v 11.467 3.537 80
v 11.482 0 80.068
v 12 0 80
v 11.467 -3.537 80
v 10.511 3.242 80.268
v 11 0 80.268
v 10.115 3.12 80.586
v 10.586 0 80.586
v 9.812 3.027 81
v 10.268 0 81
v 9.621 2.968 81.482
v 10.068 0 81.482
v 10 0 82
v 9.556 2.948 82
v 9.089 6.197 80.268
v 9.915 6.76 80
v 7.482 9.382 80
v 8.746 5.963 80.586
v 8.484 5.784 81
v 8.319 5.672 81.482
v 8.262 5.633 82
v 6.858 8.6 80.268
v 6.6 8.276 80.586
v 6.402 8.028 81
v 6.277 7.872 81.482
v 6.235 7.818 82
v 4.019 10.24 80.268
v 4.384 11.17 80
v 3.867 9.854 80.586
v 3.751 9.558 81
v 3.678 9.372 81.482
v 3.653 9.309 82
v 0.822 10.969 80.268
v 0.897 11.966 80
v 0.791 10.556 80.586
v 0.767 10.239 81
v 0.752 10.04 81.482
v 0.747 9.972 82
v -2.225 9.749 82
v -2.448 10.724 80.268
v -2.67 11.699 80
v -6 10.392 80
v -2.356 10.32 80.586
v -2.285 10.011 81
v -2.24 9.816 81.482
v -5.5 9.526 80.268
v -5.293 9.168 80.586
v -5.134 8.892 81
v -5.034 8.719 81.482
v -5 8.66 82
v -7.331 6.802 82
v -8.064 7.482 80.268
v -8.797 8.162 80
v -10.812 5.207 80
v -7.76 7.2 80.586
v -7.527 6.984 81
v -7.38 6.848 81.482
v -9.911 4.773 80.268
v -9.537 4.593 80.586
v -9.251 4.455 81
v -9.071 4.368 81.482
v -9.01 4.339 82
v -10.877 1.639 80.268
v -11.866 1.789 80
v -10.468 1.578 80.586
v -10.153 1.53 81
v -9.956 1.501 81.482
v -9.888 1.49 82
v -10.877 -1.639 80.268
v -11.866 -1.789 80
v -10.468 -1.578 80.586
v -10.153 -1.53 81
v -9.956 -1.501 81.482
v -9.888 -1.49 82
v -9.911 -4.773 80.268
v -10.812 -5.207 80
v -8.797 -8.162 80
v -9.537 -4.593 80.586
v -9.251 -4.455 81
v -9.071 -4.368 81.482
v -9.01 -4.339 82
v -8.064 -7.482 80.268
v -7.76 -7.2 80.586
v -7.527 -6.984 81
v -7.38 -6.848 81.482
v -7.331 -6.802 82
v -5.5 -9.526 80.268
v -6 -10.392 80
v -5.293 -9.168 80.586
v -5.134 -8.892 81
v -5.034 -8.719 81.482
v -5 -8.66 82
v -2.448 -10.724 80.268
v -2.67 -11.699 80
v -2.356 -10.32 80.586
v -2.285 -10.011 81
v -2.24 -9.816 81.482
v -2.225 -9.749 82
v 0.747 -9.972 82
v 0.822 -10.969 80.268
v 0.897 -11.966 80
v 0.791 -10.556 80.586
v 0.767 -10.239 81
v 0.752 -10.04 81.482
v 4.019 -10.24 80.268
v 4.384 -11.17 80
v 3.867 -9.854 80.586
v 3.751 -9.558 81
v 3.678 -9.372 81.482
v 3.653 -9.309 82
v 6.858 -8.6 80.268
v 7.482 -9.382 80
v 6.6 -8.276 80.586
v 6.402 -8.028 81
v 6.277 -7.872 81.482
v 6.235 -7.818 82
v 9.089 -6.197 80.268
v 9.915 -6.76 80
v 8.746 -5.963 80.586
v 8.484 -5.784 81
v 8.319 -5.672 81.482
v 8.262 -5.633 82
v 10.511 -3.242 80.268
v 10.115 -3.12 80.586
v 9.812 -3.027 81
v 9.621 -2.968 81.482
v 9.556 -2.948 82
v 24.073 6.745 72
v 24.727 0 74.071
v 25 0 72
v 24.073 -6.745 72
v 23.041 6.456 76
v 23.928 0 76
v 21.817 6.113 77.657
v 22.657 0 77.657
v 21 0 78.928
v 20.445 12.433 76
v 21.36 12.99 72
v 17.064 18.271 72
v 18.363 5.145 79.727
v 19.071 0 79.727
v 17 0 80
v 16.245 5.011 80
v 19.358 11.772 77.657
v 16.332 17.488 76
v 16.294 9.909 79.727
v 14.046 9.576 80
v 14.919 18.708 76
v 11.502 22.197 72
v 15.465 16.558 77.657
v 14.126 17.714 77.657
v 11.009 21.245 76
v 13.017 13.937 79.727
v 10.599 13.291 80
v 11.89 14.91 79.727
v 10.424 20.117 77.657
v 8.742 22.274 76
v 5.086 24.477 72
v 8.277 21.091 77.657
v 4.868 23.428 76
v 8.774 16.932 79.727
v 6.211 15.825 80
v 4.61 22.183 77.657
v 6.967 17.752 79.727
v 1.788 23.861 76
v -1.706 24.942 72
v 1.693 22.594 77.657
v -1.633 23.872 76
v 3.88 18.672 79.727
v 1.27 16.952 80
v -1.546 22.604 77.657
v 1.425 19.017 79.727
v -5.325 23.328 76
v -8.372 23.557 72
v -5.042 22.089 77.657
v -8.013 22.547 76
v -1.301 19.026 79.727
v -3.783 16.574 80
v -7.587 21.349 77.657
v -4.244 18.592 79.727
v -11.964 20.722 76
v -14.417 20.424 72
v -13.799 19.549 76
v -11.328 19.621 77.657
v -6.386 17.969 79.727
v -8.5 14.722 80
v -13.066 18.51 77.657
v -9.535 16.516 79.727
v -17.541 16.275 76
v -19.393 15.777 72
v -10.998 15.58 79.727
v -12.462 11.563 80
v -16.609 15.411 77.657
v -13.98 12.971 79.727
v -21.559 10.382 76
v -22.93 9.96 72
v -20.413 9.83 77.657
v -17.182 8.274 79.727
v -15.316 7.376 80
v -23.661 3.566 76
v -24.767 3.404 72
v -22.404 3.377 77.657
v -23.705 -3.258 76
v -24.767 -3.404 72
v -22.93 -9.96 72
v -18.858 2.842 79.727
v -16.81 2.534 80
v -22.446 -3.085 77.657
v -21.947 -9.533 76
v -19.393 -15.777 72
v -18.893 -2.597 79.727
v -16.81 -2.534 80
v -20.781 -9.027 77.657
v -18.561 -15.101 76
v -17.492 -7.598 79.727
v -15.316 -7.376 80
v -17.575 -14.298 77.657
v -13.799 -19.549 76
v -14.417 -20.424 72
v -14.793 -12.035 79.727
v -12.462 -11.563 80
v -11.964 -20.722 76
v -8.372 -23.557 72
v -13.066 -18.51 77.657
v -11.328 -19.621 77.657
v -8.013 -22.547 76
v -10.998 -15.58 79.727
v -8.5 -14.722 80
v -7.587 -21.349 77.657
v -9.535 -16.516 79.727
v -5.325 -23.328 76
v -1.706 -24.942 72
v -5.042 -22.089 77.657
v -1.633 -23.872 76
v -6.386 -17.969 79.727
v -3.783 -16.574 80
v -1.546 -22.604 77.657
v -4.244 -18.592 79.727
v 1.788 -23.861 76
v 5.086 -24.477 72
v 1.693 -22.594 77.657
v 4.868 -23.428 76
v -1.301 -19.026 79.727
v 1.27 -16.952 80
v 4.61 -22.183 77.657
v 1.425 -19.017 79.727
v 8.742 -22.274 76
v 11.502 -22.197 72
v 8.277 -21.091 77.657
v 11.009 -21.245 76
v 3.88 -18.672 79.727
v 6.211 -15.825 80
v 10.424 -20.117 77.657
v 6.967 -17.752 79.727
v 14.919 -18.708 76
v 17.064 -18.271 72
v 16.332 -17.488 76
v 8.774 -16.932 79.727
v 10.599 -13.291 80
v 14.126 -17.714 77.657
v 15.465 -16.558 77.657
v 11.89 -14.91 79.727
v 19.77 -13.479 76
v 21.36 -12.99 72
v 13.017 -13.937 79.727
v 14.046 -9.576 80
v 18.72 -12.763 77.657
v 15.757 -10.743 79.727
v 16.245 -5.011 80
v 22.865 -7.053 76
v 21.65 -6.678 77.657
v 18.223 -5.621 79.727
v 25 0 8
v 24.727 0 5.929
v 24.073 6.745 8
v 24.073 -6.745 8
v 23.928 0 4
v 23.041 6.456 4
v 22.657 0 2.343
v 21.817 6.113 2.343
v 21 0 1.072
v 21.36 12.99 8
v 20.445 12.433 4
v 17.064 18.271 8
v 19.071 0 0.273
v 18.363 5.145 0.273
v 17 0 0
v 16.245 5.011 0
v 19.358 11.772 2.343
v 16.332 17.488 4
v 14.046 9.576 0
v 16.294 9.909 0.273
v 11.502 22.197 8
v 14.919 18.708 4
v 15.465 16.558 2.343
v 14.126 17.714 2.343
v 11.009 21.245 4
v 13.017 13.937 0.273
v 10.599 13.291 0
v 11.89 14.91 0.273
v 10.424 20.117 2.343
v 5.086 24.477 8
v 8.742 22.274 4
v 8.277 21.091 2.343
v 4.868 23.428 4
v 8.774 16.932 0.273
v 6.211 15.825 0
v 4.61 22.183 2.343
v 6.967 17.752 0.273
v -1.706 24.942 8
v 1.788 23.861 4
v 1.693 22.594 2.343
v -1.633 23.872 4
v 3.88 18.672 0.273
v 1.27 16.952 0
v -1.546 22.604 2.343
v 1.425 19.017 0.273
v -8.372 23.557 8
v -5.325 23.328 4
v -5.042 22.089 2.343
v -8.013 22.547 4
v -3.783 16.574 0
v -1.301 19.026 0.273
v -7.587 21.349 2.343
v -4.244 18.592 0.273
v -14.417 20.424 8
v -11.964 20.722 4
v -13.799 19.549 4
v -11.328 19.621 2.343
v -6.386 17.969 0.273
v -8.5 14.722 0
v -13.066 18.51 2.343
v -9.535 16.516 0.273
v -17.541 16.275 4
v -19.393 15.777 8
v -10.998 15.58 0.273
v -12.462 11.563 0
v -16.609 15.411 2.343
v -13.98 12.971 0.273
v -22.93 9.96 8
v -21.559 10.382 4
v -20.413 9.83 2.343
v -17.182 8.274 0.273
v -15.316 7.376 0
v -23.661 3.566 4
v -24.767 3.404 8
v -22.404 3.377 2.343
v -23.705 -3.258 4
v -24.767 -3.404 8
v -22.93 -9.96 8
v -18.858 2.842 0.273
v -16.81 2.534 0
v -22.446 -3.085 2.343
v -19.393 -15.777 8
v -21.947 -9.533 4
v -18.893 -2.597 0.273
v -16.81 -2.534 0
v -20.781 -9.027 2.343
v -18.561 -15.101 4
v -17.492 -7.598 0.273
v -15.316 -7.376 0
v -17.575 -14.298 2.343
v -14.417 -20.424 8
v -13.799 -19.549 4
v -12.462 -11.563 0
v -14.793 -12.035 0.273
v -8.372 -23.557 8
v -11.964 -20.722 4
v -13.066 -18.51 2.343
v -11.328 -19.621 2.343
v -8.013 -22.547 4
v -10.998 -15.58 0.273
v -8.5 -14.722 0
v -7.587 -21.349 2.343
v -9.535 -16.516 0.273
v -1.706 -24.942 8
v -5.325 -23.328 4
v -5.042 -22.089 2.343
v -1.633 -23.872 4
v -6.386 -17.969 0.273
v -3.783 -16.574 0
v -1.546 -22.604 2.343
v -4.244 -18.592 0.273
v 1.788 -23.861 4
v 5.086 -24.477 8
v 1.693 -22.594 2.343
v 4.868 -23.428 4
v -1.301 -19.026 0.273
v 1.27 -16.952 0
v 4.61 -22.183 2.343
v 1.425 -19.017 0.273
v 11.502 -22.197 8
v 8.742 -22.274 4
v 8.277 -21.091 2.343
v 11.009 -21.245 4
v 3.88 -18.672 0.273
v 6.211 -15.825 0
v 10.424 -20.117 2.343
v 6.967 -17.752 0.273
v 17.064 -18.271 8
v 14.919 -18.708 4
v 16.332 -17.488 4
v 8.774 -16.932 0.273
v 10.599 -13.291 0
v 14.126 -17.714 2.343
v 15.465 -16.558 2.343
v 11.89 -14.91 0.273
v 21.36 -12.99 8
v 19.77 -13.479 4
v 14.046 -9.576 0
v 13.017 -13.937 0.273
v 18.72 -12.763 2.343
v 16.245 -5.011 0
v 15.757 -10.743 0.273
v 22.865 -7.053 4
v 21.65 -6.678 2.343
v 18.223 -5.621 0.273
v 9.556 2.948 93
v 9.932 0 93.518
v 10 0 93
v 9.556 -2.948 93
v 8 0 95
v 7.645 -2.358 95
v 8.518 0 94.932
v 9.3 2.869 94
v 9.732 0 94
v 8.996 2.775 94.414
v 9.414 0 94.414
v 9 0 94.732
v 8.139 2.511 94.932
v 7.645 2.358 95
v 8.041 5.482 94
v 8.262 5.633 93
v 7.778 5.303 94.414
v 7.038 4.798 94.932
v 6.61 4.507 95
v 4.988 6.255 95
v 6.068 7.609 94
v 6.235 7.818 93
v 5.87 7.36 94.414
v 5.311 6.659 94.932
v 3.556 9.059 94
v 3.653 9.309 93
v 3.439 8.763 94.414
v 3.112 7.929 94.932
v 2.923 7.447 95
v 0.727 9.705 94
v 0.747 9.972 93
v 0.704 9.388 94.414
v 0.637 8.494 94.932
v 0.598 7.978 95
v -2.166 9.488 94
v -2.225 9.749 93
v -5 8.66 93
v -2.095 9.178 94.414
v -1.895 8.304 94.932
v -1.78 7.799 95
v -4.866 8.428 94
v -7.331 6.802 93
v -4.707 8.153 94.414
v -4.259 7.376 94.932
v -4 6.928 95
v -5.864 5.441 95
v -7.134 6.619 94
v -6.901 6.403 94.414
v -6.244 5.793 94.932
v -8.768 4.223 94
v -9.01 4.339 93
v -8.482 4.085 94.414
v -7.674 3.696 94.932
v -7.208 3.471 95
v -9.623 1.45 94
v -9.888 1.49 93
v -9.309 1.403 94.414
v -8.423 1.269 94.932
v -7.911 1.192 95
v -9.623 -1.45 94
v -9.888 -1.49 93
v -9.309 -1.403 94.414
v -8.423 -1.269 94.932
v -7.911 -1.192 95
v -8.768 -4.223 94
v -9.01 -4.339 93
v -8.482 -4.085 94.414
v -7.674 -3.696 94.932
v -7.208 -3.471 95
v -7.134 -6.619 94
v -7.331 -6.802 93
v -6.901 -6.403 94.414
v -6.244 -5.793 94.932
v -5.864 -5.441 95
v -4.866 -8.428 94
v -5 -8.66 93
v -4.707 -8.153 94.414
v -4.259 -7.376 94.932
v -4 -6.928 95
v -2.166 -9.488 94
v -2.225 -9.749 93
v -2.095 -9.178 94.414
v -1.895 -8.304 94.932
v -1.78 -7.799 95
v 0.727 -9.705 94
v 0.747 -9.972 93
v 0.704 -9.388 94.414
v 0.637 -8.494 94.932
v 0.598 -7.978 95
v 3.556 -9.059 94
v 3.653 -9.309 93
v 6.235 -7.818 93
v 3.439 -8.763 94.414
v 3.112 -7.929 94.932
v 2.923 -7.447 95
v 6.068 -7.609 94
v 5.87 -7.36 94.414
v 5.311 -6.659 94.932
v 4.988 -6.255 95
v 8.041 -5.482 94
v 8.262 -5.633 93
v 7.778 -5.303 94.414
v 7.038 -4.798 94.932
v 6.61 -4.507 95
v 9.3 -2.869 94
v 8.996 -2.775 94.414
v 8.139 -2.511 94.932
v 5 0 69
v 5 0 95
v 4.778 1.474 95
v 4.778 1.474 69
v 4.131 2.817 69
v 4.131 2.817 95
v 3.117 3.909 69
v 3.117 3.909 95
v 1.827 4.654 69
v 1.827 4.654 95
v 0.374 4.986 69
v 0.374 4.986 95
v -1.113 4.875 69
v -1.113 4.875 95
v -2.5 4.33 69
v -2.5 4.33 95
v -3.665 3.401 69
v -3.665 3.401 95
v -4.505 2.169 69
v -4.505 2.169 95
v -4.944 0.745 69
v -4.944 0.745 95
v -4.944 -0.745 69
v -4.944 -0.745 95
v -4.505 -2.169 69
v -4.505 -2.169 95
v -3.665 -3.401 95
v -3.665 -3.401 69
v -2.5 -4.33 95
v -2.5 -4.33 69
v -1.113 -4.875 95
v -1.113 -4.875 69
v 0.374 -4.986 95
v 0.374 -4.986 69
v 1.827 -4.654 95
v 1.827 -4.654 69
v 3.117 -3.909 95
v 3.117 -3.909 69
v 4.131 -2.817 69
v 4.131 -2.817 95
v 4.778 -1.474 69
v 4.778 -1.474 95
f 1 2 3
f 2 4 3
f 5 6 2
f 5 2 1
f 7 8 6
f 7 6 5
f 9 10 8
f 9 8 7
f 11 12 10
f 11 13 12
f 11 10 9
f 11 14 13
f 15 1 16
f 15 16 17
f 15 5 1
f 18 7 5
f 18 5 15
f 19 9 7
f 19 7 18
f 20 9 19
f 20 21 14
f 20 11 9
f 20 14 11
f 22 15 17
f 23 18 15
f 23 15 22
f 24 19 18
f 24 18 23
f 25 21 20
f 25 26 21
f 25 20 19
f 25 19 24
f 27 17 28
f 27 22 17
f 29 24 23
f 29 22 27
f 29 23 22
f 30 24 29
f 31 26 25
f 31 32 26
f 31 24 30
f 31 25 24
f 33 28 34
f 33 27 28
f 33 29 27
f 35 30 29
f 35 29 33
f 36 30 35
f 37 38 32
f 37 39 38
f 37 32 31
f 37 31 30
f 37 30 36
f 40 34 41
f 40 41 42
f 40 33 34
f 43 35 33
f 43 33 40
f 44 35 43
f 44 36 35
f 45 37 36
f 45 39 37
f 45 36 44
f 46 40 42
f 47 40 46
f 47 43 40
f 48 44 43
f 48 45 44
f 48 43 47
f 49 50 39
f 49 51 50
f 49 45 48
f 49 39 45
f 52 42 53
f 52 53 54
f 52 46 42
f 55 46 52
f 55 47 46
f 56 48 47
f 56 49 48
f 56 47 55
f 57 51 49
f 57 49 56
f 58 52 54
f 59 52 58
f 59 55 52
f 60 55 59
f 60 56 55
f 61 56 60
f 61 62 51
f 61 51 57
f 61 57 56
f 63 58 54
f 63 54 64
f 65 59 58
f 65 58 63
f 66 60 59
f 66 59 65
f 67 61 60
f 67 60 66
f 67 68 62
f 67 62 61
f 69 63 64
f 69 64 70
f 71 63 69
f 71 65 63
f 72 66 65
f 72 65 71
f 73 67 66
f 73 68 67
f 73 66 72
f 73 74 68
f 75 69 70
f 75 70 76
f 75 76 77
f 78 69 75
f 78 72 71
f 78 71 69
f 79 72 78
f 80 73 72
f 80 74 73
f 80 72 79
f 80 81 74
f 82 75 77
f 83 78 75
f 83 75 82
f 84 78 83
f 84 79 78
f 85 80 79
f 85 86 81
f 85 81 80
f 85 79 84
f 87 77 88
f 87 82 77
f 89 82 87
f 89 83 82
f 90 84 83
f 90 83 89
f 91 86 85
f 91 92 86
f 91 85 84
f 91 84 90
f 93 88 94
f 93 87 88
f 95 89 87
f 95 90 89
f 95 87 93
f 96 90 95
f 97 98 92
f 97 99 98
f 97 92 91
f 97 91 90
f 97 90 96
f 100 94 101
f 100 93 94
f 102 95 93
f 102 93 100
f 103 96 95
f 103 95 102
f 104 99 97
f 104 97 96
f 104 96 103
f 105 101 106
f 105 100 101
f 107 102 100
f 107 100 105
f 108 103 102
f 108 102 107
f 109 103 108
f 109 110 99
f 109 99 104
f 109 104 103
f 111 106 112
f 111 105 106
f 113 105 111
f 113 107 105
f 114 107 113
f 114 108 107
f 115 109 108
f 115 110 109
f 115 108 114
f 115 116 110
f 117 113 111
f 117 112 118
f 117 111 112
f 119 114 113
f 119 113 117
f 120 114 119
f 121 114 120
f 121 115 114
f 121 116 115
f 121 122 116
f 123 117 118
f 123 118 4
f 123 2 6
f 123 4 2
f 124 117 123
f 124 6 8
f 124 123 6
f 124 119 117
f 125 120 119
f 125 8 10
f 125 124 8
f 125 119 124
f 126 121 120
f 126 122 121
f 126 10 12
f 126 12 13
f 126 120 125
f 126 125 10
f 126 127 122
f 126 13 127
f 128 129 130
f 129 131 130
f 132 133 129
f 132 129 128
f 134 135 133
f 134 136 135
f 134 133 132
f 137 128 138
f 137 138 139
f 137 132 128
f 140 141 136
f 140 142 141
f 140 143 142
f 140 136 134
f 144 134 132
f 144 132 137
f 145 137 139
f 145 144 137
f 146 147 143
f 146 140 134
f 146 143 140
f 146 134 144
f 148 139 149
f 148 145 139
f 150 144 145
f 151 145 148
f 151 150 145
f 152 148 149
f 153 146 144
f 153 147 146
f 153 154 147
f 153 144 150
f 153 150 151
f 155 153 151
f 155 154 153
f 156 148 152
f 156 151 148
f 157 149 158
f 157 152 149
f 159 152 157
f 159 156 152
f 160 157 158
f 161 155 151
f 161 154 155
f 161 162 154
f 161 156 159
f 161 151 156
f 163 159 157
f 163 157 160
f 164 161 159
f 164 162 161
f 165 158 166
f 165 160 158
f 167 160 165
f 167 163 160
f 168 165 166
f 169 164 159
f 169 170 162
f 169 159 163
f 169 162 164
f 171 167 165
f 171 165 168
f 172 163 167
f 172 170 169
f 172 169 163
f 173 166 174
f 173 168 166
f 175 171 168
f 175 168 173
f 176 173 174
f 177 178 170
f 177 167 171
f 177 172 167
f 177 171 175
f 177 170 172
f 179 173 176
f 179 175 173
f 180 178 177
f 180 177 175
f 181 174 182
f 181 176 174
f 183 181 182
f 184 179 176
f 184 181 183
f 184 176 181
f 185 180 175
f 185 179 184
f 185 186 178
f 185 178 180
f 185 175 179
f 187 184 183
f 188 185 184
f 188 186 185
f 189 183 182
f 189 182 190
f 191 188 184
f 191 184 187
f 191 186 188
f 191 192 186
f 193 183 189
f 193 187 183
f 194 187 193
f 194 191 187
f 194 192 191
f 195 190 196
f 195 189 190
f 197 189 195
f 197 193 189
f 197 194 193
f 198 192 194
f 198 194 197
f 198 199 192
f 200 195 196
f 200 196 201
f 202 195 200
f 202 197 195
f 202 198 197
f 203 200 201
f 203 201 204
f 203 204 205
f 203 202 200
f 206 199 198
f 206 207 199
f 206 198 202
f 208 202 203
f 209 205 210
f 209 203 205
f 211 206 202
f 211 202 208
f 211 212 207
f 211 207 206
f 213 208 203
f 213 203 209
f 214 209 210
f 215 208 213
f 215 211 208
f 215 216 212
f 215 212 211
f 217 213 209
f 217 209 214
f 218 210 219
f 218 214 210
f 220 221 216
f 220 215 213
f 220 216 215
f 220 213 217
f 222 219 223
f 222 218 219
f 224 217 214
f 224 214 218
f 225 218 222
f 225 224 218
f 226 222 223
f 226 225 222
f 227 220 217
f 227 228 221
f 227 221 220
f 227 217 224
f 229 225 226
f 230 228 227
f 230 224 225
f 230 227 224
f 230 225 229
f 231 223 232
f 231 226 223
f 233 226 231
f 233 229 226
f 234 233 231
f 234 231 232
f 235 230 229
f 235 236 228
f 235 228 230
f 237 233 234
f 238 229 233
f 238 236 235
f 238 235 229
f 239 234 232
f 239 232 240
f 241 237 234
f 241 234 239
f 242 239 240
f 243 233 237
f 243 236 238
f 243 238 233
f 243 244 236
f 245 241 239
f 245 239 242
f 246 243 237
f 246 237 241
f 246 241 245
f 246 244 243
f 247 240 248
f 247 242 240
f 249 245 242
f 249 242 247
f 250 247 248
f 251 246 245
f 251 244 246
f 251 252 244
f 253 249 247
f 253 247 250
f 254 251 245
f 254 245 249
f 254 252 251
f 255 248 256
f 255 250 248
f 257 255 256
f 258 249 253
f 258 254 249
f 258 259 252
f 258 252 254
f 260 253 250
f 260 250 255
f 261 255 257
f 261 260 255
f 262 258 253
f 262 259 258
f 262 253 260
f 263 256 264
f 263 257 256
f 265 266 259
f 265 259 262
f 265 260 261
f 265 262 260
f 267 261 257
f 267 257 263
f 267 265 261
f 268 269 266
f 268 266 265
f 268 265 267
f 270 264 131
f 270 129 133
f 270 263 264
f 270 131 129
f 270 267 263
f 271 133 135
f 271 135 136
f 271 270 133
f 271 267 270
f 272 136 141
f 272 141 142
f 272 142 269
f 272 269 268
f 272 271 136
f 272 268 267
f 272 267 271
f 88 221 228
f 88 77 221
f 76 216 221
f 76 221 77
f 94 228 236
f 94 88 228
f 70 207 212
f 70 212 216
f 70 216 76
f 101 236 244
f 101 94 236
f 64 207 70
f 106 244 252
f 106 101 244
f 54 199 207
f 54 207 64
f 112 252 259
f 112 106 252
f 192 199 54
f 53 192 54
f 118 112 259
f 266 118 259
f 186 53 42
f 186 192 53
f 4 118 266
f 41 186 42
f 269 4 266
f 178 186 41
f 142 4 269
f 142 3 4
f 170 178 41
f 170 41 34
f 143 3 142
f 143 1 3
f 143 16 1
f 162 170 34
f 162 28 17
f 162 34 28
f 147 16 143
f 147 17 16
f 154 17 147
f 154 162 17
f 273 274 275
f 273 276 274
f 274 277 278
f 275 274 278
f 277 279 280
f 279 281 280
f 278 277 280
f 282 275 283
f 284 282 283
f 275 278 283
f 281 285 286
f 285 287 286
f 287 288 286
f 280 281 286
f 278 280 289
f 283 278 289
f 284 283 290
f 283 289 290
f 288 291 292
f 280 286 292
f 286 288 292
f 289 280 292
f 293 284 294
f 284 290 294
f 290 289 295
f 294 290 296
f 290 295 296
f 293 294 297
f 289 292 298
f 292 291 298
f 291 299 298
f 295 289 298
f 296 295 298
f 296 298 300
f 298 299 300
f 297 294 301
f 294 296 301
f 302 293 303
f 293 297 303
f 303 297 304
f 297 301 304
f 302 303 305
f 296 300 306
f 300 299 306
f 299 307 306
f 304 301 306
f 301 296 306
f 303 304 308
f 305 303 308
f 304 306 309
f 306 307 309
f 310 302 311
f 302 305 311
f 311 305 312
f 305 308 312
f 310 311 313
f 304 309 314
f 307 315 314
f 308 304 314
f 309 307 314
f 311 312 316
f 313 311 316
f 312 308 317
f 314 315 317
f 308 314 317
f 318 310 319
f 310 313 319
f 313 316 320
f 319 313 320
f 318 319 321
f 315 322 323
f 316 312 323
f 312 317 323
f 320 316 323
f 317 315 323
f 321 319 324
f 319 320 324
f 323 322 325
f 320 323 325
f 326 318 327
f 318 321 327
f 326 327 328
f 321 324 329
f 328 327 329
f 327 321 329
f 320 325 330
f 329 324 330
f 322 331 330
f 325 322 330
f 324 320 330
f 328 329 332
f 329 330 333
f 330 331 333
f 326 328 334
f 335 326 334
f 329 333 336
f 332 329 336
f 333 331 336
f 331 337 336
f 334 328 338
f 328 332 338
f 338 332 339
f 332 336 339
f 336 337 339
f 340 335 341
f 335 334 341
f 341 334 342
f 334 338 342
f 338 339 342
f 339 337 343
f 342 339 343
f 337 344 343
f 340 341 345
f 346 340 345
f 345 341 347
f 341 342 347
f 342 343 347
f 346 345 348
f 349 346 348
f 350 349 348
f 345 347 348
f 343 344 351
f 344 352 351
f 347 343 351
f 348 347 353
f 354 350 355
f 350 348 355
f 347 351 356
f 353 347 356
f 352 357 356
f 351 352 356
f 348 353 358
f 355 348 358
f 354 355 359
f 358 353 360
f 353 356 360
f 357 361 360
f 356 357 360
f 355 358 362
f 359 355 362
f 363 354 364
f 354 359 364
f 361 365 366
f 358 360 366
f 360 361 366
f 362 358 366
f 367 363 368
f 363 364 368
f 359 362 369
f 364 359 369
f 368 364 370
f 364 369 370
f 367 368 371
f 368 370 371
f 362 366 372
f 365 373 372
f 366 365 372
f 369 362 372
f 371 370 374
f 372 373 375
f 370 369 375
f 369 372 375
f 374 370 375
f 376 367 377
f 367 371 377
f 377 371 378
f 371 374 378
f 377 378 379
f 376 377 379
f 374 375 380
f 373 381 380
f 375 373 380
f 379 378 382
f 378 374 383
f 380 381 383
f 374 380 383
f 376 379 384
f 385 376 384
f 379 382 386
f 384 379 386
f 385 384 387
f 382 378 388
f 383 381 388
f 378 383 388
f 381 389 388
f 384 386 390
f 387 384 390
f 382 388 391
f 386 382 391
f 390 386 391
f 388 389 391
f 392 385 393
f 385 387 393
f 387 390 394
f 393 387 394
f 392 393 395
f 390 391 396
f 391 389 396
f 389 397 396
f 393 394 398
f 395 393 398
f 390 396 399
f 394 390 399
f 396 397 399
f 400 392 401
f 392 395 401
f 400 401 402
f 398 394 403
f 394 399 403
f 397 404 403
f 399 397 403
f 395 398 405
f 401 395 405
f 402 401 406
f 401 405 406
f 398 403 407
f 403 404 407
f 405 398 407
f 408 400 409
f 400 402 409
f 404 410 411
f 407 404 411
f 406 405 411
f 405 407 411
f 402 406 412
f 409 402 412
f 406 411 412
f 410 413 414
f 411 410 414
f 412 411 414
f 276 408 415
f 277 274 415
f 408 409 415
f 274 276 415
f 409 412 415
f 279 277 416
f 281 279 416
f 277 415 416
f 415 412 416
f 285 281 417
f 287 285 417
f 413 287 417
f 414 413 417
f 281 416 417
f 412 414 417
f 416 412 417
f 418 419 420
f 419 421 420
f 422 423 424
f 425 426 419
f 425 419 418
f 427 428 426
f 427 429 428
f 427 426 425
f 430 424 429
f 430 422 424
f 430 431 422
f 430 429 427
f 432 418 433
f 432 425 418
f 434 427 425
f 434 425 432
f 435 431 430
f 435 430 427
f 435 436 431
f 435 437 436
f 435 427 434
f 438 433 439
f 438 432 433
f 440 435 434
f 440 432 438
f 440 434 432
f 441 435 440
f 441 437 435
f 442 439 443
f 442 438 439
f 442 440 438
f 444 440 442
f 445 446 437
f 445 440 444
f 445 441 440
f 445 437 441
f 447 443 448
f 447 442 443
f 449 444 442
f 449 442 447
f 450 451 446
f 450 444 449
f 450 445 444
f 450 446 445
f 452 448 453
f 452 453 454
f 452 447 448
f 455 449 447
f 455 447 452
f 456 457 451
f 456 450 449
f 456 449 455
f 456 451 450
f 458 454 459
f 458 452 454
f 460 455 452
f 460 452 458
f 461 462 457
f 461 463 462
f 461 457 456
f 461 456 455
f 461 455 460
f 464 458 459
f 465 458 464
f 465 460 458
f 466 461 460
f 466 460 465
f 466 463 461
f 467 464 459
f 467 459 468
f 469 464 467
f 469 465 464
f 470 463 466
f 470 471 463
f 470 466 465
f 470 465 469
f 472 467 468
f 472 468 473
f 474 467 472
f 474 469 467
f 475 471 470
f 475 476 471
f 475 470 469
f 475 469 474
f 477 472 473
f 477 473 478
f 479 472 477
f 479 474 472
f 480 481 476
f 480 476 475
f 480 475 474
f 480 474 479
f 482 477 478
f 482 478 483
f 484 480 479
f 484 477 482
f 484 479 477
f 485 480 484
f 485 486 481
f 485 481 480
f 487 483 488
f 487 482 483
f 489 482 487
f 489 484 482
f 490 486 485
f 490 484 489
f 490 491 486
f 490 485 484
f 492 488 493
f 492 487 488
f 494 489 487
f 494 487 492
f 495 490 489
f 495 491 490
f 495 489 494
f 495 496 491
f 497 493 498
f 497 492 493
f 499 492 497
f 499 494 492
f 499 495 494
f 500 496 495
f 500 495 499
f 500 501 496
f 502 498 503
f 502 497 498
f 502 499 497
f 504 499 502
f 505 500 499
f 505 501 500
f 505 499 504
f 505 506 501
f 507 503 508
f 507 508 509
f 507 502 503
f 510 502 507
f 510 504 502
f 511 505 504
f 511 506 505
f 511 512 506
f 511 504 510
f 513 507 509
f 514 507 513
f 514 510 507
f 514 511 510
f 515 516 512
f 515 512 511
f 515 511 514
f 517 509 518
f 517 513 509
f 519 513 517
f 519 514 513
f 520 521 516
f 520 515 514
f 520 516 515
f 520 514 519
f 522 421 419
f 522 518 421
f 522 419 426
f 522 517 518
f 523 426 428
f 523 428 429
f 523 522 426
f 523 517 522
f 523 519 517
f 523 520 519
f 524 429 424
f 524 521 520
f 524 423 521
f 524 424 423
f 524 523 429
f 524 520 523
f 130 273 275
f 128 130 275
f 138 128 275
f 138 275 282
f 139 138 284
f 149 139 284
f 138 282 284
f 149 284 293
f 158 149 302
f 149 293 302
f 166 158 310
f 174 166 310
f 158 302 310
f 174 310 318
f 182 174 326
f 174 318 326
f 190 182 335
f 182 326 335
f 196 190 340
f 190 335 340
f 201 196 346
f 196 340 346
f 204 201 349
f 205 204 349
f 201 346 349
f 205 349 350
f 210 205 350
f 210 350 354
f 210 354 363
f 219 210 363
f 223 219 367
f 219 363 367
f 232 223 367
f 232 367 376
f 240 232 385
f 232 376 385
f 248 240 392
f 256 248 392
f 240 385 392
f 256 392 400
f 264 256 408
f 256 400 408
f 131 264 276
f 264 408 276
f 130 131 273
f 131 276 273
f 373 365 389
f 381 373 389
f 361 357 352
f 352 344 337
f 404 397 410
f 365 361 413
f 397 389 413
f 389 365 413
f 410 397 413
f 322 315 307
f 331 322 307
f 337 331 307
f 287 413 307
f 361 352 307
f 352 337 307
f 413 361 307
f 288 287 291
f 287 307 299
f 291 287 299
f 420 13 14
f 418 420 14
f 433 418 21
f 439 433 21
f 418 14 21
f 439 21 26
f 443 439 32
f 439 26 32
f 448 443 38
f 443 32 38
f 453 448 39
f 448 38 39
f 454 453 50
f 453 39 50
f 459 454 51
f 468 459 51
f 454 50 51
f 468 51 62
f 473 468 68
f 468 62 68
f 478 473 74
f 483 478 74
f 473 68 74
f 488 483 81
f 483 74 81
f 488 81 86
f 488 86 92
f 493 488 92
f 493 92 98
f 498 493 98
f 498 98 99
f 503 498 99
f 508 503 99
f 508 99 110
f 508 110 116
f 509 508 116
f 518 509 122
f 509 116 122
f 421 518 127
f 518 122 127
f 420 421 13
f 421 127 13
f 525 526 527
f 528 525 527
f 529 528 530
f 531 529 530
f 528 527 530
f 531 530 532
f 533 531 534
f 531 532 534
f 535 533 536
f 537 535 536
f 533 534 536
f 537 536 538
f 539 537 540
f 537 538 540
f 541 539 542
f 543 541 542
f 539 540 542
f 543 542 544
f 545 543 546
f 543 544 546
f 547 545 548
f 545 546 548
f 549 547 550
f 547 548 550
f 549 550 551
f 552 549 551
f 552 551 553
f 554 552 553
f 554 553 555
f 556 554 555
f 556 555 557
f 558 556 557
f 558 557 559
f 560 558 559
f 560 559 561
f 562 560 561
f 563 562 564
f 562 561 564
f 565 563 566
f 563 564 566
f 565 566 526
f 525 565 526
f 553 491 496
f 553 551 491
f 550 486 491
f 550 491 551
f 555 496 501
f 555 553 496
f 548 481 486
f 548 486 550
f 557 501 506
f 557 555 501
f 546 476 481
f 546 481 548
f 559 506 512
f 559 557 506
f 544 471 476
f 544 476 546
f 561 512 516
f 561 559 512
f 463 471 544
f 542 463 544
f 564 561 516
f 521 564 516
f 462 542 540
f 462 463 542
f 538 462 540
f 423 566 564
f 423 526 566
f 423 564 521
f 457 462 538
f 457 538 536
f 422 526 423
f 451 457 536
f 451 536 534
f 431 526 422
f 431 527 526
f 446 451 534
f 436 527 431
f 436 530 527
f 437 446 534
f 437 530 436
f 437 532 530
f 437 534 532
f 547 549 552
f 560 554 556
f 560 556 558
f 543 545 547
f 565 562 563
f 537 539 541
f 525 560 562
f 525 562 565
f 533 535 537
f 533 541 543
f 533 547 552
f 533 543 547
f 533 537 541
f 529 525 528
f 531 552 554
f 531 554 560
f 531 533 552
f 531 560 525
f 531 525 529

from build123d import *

# Parameters (mm, degrees)
SKETCH1_R           = 25
BOSS_EXTRUDE1_DEPTH = 80
SKETCH2_R           = 10
BOSS_EXTRUDE2_DEPTH = 15
FILLET1_R           = 8
FILLET2_R           = 8
FILLET3_R           = 2
SKETCH3_R           = 5
CUT_EXTRUDE1_DEPTH  = 26


with BuildPart() as part:
    # Sketch1 → Boss-Extrude1 (new body)
    with BuildSketch(Plane.XY):
        Circle(SKETCH1_R)
    extrude(amount=BOSS_EXTRUDE1_DEPTH)

    # Sketch2 → Boss-Extrude2 (add)
    with BuildSketch(Plane.XY.offset(80)):
        Circle(SKETCH2_R)
    extrude(amount=BOSS_EXTRUDE2_DEPTH)

    # Fillet1
    fillet1_edges = [part.edges().sort_by_distance(p)[0] for p in [
        (-25, 0, 80),
    ]]
    fillet(fillet1_edges, radius=FILLET1_R)

    # Fillet2
    fillet2_edges = [part.edges().sort_by_distance(p)[0] for p in [
        (-25, 0, 0),
    ]]
    fillet(fillet2_edges, radius=FILLET2_R)

    # Fillet3
    fillet3_edges = [part.edges().sort_by_distance(p)[0] for p in [
        (-10, 0, 80),
        (-10, 0, 95),
    ]]
    fillet(fillet3_edges, radius=FILLET3_R)

    # Sketch3 → Cut-Extrude1 (cut)
    with BuildSketch(Plane.XY.offset(95)):
        Circle(SKETCH3_R)
    extrude(amount=-CUT_EXTRUDE1_DEPTH, mode=Mode.SUBTRACT)


solid = part.part
